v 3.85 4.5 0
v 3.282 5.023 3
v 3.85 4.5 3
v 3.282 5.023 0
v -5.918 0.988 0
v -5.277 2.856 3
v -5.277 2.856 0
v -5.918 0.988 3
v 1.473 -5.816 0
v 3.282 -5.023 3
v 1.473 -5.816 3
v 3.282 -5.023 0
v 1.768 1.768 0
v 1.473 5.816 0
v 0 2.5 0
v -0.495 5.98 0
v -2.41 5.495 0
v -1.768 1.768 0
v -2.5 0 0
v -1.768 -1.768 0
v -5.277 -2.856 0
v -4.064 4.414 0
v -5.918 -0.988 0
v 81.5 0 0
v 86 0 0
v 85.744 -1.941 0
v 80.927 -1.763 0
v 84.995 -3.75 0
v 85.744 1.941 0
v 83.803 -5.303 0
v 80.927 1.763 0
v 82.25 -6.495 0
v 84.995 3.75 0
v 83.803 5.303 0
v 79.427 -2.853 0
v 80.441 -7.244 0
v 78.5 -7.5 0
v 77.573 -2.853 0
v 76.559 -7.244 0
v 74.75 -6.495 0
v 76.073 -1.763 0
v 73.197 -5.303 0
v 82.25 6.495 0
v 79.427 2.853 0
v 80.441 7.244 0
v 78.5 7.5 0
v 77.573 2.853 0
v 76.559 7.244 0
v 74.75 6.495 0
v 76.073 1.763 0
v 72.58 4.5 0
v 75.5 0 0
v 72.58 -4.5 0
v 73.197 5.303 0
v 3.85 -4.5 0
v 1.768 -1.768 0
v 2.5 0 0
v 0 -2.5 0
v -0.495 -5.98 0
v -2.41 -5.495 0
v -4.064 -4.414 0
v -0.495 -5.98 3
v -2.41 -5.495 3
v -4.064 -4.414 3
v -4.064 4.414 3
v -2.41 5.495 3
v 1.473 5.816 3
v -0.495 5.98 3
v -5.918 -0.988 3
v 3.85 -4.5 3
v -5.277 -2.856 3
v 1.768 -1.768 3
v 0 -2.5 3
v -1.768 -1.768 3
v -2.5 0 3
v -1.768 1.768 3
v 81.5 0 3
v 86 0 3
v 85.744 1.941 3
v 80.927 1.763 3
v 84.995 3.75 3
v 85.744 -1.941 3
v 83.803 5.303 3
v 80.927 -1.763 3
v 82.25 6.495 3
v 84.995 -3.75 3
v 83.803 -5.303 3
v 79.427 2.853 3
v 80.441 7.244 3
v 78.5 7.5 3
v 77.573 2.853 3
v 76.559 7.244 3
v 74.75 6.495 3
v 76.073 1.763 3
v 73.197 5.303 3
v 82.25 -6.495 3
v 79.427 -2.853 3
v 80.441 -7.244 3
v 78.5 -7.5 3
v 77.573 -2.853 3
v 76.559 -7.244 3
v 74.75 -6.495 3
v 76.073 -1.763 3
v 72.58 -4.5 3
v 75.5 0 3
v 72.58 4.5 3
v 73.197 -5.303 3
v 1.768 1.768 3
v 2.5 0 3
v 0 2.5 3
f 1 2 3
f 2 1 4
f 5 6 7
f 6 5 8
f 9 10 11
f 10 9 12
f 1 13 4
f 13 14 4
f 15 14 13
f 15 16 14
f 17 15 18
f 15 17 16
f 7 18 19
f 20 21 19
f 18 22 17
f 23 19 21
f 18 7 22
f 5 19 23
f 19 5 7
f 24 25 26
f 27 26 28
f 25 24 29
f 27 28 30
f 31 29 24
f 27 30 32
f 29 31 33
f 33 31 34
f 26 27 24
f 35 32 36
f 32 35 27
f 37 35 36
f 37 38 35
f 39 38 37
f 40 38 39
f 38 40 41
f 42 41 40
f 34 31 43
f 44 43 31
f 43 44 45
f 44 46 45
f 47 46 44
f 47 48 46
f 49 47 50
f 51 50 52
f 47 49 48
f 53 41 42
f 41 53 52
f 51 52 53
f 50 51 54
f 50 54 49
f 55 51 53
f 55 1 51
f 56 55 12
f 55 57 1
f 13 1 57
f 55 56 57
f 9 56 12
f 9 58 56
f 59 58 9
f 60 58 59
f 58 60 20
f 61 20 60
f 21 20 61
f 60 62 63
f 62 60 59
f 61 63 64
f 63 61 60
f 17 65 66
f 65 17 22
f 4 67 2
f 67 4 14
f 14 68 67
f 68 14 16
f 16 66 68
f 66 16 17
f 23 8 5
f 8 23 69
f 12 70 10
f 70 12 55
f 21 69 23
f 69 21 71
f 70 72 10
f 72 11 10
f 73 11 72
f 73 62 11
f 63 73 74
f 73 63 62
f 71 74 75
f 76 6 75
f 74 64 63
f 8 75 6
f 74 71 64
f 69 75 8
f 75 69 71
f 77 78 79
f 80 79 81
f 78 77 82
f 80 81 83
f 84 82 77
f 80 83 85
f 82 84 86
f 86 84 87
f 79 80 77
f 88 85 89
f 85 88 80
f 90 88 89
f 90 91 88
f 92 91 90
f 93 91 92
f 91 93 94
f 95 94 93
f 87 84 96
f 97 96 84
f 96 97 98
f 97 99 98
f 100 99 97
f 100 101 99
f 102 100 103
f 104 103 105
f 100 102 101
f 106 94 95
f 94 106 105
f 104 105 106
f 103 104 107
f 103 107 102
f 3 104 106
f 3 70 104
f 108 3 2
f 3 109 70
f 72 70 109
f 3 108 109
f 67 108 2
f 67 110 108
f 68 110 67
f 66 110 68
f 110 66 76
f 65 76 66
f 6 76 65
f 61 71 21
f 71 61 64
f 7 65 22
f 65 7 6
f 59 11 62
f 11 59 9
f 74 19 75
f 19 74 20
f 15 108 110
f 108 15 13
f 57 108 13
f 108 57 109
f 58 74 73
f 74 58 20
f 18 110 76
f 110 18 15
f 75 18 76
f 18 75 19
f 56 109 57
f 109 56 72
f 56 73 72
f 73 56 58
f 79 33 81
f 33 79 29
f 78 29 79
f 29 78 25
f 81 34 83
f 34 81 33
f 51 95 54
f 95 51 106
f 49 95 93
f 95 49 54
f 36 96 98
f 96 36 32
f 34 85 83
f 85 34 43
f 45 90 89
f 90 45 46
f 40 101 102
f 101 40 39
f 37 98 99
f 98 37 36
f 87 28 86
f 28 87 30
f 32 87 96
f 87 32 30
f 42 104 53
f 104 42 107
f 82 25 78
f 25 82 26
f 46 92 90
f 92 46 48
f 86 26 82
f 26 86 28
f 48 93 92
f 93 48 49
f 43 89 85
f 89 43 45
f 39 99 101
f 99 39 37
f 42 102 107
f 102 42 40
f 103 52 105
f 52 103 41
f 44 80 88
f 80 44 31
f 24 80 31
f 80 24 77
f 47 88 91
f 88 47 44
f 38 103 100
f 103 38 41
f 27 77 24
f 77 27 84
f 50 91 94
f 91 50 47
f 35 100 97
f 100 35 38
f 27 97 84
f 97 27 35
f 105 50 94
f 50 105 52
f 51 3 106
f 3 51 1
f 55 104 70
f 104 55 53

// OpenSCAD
servoMountOuterRadius = 6.0;
servoMountInnerRadius = 2.5;

armLengthCenterToCenter = 81.5;
armHeight = 3.0;
armWidth = 9.0;

stylusHolderOuterRadius = 7.5;
stylusHolderInnerRadius = 3.0;

module servoShaftMount() {
	difference() {
		cylinder(r=servoMountOuterRadius, h=armHeight);
   translate([0,0,-1]) // start 1 mm below the surface
		cylinder(r=servoMountInnerRadius, h=armHeight+2);
	}
}

module stylusHolder() {
	difference() {
		cylinder(r=stylusHolderOuterRadius, h=armHeight);
		cylinder(r=stylusHolderInnerRadius, h=armHeight);
	}
}

module arm() {
	cube([armLengthCenterToCenter - servoMountInnerRadius - stylusHolderOuterRadius, armWidth, armHeight]);
}

union() {
	servoShaftMount();
	translate([servoMountInnerRadius, -armWidth / 2.0, 0])	arm();
	translate([armLengthCenterToCenter - stylusHolderInnerRadius, 0, 0]) stylusHolder();
}
